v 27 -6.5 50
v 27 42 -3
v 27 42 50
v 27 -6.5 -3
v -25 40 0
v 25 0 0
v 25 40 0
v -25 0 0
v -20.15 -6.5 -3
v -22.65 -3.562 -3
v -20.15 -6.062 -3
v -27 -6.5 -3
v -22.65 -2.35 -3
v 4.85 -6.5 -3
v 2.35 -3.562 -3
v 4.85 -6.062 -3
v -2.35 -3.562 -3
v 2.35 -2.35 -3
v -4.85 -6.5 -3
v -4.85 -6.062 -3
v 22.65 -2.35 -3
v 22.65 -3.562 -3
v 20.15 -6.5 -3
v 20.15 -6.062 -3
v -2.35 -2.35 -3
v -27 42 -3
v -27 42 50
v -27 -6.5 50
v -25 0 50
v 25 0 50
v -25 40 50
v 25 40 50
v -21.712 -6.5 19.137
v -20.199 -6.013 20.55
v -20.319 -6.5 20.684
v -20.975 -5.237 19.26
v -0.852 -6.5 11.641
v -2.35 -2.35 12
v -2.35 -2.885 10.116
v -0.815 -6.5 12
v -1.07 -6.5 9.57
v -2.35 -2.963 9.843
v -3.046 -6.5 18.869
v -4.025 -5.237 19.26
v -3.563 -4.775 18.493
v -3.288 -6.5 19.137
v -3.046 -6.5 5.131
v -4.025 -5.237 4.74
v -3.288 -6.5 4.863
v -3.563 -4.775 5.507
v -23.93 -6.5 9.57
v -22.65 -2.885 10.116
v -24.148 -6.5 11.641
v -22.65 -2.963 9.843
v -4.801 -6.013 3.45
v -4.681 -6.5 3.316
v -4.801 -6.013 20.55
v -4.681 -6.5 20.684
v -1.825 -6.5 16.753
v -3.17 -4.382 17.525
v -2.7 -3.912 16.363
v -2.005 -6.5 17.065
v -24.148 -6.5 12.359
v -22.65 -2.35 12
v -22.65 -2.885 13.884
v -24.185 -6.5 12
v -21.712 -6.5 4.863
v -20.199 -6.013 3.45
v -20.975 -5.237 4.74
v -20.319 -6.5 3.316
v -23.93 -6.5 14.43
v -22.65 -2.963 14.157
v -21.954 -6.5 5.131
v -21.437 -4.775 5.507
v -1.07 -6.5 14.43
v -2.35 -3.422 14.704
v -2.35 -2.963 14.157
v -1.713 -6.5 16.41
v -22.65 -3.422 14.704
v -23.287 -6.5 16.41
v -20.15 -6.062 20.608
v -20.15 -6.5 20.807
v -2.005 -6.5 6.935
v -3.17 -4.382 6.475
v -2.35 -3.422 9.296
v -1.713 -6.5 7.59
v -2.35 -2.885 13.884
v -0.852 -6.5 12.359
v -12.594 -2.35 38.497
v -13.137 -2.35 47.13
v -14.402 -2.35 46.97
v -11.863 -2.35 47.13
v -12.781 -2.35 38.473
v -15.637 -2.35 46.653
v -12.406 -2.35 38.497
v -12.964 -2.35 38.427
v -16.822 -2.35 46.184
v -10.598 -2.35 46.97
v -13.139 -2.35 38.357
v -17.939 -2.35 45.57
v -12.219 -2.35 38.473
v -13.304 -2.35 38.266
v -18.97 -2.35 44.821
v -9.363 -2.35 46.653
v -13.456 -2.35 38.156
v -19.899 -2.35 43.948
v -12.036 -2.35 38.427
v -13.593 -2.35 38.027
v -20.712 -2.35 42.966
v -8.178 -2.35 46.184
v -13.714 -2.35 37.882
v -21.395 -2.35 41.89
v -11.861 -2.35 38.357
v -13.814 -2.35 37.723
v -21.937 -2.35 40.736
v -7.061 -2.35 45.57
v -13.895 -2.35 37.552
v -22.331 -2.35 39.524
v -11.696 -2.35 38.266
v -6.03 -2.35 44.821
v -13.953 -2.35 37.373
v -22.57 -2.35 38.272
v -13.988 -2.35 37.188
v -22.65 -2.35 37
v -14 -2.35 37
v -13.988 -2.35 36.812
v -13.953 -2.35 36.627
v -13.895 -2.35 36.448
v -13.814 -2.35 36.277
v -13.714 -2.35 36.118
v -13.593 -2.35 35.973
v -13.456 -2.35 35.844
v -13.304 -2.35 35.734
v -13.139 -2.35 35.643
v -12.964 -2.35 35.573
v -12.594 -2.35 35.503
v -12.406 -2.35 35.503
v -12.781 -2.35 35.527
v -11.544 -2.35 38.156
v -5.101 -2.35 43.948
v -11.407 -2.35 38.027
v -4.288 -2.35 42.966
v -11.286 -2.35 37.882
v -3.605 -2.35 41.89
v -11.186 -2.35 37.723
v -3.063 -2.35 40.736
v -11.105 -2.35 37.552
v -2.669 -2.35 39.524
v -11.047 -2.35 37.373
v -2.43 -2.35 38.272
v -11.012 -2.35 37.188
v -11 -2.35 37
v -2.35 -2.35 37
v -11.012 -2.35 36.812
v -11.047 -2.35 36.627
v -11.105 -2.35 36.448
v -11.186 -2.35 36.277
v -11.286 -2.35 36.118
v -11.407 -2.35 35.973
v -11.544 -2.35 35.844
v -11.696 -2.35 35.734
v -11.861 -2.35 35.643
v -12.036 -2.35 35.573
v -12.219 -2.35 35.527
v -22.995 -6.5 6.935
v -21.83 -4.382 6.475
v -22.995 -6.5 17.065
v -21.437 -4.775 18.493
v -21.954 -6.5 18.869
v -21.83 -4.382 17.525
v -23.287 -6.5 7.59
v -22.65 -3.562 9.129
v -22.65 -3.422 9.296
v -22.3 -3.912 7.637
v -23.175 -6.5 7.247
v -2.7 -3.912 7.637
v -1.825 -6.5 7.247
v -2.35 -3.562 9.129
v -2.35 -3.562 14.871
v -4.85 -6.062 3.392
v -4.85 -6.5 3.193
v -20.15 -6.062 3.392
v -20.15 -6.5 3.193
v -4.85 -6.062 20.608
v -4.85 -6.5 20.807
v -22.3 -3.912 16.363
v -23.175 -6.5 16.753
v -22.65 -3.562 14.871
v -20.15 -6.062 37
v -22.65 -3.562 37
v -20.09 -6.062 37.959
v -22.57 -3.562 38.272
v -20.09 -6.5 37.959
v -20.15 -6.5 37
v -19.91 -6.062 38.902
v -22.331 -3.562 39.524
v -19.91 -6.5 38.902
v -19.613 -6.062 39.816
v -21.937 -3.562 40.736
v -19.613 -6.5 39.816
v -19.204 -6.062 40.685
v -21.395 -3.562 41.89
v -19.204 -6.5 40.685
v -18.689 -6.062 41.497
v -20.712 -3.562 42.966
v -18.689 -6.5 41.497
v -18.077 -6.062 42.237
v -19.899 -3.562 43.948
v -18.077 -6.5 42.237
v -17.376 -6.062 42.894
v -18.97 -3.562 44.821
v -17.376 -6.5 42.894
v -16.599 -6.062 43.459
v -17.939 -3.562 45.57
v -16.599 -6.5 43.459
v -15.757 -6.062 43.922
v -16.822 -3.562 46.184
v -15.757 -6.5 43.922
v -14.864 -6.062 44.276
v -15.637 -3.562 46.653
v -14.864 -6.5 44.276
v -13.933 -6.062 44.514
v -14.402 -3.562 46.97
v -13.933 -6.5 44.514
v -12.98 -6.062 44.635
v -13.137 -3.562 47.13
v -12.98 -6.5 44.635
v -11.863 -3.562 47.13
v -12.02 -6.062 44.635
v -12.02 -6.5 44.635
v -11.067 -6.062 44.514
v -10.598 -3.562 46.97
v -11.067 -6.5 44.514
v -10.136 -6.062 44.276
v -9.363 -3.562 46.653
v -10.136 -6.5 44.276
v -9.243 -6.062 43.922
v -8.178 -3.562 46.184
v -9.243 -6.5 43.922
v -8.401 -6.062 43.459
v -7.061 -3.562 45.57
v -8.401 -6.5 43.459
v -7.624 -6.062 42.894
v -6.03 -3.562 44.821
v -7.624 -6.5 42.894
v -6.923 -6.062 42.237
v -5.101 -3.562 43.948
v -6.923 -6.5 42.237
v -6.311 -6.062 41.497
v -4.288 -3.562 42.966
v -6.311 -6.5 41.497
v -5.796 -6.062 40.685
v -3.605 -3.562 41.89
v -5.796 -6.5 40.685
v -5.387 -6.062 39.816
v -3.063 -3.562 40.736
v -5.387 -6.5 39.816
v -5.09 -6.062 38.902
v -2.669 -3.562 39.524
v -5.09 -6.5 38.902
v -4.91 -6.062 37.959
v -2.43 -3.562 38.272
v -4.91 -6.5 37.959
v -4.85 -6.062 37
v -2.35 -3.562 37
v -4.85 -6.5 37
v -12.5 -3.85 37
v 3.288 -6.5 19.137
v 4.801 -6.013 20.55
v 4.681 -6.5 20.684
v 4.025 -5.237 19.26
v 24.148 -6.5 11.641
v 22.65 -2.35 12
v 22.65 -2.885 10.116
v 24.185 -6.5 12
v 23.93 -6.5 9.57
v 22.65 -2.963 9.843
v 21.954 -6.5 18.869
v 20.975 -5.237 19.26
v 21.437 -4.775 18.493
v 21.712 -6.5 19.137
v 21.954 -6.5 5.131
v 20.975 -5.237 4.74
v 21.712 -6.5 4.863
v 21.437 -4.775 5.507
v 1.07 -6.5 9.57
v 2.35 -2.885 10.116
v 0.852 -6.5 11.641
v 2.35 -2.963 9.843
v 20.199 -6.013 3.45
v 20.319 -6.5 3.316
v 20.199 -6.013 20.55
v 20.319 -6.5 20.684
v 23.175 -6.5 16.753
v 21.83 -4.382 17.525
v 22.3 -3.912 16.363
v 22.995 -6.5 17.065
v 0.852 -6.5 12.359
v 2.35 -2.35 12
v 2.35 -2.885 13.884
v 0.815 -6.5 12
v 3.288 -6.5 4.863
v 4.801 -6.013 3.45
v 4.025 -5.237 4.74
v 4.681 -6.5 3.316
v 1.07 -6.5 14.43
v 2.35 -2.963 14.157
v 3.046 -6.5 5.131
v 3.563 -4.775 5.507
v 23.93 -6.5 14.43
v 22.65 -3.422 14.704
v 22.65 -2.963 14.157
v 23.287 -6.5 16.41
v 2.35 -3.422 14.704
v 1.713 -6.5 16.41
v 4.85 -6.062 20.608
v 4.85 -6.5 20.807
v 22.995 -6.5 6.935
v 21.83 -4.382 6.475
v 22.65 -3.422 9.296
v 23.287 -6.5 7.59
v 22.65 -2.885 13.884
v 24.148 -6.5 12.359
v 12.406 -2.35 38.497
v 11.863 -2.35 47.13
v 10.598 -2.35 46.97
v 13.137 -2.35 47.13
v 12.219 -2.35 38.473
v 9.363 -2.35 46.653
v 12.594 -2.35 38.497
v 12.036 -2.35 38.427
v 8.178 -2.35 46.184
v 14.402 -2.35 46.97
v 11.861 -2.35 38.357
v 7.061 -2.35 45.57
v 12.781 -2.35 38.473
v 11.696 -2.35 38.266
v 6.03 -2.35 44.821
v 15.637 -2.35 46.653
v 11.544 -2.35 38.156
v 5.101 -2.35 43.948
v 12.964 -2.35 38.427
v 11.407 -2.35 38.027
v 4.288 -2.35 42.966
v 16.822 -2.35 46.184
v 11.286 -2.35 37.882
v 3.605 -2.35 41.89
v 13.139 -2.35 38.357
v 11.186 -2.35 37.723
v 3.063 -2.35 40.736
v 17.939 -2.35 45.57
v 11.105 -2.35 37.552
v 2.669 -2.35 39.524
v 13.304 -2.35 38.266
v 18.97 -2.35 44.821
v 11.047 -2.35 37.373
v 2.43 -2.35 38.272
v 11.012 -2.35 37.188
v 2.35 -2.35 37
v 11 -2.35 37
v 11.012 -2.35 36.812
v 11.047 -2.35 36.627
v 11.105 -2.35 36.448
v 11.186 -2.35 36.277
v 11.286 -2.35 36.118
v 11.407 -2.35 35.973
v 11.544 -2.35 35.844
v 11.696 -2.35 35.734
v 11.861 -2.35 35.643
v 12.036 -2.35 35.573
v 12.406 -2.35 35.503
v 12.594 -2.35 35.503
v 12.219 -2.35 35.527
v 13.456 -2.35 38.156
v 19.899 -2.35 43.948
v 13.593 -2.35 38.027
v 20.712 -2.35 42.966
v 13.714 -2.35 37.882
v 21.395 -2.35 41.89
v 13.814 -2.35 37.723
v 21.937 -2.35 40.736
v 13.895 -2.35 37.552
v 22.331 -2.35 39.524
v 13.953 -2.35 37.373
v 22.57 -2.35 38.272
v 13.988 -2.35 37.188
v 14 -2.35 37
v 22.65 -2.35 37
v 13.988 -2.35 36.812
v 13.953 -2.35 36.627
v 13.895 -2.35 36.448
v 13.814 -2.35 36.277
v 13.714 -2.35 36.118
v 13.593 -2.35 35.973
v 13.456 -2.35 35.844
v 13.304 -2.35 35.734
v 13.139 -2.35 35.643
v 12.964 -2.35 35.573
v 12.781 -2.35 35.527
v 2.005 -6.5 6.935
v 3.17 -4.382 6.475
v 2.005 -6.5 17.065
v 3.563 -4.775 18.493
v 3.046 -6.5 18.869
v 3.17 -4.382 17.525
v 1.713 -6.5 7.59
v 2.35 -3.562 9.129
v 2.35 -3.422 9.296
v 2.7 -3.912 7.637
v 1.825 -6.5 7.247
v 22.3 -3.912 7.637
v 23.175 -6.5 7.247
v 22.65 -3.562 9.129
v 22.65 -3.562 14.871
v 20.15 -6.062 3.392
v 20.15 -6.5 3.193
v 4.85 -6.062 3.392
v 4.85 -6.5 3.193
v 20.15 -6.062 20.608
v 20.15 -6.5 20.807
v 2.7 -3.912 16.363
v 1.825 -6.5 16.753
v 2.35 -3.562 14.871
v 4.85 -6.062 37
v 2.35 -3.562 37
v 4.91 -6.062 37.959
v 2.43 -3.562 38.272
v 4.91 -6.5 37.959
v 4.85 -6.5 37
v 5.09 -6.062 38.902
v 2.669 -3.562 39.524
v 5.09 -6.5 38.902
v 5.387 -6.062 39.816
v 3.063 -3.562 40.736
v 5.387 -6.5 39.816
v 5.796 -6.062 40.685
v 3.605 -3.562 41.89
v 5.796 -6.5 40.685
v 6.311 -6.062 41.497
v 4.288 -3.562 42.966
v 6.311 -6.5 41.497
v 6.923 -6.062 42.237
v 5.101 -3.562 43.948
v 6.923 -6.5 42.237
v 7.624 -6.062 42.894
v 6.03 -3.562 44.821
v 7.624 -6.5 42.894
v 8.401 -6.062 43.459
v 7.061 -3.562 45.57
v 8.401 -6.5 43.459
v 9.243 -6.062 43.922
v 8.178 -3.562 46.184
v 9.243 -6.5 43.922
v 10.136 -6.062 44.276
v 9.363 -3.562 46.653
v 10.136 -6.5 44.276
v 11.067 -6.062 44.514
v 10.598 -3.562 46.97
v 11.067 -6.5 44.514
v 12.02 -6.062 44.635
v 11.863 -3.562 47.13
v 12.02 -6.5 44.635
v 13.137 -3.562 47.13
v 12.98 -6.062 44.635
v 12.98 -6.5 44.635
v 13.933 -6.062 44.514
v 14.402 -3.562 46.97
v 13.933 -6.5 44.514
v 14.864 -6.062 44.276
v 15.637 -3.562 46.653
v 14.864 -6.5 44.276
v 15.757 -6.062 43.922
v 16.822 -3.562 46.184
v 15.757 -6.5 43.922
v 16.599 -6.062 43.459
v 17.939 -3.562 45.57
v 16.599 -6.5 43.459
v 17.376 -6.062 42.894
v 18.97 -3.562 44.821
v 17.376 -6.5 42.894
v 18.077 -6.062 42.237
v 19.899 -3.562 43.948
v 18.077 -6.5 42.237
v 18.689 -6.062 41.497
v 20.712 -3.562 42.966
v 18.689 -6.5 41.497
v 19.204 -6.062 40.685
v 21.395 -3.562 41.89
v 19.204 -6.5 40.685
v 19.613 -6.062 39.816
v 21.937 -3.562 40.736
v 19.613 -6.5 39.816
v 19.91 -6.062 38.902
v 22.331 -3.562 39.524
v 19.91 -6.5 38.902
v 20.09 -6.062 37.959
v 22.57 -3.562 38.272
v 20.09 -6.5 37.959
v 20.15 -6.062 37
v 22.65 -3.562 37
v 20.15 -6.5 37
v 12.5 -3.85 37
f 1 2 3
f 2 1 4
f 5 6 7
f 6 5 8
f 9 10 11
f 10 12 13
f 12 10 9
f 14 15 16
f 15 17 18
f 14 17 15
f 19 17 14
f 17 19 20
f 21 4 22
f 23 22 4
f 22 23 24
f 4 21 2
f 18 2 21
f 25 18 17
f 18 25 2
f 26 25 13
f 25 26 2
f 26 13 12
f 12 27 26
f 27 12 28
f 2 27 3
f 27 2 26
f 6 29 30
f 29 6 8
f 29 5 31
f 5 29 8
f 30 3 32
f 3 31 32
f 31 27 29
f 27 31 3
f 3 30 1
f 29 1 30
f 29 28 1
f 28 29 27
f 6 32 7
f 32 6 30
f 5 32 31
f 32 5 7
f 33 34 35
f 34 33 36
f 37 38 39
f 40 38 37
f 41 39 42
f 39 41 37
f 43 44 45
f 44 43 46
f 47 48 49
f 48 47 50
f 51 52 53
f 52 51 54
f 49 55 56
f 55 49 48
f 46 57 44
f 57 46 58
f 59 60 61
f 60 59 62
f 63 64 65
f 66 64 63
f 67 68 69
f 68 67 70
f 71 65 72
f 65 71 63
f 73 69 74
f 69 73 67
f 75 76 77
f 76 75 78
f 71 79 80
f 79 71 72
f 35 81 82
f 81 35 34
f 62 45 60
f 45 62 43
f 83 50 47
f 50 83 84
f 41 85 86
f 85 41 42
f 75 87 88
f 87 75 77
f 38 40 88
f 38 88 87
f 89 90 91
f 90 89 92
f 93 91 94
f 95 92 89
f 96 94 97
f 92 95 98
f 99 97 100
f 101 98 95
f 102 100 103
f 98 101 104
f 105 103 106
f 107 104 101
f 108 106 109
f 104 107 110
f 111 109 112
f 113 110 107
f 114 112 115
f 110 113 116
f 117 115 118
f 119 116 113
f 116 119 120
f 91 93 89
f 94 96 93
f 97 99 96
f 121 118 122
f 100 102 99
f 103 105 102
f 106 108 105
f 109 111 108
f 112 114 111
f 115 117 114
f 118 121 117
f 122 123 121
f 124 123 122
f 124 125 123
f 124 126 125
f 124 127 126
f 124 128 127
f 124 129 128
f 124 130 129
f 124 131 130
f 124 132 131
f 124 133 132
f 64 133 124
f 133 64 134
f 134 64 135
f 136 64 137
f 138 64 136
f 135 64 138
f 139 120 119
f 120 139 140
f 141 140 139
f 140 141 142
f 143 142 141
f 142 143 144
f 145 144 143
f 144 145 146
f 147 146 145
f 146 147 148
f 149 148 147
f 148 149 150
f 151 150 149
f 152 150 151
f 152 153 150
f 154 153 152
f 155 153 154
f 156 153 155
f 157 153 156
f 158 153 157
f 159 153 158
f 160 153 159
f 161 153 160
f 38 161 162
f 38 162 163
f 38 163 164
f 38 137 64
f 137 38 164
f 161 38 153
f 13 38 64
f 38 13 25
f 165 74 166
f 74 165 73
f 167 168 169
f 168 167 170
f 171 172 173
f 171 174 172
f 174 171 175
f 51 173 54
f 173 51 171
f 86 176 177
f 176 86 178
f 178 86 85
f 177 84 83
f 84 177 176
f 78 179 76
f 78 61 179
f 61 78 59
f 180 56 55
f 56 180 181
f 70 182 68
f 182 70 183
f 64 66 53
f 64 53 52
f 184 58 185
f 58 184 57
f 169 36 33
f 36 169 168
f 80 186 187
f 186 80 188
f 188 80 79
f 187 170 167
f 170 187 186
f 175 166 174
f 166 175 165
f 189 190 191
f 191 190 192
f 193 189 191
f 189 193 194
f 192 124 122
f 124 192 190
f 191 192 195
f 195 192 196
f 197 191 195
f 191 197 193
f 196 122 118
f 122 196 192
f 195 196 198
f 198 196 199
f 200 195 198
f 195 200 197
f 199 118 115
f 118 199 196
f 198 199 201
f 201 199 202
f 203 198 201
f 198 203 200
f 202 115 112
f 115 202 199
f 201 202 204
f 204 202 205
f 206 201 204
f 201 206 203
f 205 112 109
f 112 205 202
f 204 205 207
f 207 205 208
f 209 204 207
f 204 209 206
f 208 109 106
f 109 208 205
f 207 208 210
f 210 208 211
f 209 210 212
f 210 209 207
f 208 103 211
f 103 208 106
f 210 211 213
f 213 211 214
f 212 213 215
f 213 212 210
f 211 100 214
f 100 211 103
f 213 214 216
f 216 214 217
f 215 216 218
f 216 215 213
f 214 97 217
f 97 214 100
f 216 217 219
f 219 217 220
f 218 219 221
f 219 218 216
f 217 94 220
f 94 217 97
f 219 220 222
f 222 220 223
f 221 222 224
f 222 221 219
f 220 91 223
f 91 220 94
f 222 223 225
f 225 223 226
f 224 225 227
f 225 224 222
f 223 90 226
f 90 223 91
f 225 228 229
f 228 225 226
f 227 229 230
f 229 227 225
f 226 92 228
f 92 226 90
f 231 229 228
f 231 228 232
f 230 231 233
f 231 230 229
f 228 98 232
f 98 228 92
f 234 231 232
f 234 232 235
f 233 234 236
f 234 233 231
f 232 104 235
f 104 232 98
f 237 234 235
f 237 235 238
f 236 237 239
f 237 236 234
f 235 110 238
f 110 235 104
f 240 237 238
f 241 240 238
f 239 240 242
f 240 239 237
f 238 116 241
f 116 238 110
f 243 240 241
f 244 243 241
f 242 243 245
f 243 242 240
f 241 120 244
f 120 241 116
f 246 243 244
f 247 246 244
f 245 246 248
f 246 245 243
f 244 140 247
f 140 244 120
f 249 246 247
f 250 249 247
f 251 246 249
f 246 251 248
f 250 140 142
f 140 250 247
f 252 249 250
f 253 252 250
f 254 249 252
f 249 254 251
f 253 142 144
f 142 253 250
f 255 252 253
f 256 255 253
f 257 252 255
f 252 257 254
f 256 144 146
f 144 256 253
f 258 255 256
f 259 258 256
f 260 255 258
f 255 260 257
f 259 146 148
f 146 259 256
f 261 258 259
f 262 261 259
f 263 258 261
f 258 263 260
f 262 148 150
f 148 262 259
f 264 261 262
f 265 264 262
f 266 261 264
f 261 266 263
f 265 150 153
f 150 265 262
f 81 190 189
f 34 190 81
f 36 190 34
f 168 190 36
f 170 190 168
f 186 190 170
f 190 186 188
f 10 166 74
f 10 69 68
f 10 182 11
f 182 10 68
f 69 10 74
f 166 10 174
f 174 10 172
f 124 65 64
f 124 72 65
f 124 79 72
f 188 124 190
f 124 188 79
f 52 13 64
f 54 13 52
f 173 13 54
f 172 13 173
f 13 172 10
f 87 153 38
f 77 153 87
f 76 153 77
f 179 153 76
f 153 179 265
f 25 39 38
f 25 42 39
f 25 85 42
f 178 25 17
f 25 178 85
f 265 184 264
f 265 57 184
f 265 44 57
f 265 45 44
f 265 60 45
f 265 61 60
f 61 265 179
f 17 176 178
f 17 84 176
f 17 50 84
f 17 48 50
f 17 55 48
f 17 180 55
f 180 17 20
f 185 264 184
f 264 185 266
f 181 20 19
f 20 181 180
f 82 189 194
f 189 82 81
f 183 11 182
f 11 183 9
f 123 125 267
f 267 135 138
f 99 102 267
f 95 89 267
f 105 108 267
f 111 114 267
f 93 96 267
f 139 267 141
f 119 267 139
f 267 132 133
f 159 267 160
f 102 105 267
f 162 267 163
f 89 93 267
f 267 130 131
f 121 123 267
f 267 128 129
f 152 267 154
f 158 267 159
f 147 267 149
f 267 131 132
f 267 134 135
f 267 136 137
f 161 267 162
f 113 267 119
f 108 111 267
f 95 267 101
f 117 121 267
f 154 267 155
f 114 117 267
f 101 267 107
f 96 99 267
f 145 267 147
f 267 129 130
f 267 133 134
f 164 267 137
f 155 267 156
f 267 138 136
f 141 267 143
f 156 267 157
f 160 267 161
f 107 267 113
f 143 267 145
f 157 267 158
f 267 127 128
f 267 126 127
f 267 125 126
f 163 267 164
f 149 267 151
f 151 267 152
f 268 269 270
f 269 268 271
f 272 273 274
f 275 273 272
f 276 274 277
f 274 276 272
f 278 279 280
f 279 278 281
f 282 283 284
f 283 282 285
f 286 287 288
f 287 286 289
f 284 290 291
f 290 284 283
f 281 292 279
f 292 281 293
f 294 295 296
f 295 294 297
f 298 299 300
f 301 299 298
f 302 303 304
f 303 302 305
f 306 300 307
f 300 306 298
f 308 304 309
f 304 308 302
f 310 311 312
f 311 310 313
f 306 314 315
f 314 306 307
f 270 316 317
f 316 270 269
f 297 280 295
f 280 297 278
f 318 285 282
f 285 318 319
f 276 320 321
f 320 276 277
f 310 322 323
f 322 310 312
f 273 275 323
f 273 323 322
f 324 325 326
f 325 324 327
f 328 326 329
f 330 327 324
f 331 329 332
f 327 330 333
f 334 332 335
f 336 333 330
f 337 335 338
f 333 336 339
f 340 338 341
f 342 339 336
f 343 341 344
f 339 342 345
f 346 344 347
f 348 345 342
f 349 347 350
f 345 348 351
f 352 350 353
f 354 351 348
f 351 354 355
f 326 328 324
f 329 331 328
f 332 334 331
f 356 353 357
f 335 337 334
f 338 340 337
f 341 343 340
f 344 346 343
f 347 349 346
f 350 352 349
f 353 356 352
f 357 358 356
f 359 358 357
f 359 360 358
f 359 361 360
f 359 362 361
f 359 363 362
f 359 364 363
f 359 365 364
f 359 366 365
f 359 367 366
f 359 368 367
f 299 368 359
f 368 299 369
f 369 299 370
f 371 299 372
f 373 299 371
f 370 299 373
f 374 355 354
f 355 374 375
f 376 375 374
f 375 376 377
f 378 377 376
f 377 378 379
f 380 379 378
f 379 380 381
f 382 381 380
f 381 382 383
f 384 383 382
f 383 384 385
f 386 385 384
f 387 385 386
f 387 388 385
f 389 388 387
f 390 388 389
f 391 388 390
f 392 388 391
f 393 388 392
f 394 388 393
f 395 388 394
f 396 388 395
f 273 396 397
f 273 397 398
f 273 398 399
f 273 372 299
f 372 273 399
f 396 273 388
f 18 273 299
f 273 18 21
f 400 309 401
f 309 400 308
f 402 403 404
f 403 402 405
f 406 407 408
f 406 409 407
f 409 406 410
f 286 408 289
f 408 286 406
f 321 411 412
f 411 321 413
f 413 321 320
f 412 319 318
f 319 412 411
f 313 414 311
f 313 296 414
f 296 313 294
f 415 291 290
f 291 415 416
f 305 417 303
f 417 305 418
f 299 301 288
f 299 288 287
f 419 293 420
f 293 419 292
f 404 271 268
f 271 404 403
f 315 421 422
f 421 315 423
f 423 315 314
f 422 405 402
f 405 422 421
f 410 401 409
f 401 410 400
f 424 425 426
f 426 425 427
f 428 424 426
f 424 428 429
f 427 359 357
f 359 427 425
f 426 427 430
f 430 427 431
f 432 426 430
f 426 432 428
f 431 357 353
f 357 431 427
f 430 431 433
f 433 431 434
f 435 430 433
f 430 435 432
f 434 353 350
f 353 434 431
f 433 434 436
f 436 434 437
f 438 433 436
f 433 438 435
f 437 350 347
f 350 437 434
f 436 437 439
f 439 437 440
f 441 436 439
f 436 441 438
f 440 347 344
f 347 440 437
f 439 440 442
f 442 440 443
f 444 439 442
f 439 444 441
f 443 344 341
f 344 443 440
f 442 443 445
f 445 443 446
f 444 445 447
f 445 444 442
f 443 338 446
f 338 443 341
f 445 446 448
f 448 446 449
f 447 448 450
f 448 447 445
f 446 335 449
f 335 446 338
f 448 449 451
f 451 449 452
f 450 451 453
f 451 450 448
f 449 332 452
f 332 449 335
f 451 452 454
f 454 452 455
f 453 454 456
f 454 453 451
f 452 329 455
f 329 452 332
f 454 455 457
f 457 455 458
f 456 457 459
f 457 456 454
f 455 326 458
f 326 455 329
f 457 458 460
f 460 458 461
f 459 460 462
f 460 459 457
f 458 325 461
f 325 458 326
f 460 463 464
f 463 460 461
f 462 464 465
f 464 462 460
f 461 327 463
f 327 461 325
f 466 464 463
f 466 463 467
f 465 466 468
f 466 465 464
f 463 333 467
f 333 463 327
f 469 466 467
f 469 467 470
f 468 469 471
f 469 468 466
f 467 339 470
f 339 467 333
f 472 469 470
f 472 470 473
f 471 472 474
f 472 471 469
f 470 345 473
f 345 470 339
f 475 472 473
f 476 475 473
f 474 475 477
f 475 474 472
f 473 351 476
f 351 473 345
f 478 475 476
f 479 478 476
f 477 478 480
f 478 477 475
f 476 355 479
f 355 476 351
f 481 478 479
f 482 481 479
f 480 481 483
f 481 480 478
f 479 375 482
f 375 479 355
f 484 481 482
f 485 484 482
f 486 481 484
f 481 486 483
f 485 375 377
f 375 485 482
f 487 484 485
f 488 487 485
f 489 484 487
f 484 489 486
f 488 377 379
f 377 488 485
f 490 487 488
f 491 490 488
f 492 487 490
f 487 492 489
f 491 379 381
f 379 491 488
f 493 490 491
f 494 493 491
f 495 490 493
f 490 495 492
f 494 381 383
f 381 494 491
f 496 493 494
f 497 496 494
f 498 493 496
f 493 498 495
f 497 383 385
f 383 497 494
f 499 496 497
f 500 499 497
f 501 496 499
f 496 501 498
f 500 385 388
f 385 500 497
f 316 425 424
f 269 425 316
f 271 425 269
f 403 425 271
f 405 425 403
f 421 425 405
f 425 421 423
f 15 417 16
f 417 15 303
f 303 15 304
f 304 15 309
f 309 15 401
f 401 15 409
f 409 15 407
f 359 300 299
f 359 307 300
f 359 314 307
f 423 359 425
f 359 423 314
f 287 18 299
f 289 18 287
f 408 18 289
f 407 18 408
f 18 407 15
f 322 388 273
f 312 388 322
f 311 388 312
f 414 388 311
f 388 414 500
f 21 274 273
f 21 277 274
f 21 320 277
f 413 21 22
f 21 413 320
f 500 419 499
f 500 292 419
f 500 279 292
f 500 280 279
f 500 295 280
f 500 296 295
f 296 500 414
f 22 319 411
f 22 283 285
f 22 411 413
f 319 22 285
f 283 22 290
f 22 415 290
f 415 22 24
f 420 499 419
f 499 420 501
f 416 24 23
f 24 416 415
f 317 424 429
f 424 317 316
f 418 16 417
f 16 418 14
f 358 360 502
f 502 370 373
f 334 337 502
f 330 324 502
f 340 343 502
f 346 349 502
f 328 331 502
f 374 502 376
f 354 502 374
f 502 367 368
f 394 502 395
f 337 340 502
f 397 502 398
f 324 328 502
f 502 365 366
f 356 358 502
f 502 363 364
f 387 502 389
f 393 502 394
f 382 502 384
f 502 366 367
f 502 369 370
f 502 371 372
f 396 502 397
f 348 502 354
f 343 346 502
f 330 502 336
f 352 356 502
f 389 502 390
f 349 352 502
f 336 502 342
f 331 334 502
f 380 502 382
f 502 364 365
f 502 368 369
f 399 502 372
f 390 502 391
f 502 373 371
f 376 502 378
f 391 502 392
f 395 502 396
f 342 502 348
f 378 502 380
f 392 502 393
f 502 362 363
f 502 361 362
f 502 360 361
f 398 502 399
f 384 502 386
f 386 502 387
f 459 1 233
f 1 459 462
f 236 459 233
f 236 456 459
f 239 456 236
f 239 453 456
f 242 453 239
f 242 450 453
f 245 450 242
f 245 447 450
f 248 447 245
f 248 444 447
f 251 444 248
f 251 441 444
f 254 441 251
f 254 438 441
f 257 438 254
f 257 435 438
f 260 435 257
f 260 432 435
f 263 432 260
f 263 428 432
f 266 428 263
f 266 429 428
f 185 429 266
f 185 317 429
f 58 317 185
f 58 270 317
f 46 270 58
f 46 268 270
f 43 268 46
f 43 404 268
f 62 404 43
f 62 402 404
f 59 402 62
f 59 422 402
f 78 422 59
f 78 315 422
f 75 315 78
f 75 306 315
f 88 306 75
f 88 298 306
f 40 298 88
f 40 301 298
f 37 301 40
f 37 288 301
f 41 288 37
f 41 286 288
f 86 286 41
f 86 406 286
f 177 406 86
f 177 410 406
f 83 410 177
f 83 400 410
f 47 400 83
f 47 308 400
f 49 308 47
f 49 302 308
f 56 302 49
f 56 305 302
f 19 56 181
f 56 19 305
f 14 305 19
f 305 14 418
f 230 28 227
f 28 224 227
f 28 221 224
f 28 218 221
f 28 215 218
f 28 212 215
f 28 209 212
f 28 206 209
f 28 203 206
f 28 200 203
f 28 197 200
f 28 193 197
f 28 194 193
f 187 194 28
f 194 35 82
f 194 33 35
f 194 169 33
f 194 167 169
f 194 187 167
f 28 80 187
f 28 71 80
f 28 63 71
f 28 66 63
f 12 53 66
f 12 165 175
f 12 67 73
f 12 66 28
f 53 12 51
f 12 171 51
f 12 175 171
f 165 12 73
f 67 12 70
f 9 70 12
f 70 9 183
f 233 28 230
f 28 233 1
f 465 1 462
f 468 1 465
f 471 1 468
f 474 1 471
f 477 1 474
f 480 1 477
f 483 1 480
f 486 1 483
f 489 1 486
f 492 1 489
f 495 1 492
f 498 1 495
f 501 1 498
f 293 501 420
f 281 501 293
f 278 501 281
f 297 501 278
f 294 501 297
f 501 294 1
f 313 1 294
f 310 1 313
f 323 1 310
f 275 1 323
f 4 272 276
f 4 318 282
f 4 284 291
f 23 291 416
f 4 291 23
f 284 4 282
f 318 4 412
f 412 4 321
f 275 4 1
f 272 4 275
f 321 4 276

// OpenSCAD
/* [Internal Dimensions] */
//Height (in mm) from the top of the back to the base of the internal floor
internalHeight = 50.0; //.1
//Width (in mm) of the internal dimension or item you wish to hold
internalWidth = 50.0; //.1
//Length (i.e., distance from back) (in mm) of the internal dimension or item you wish to hold
internalDepth = 40.0; //.1

/* [Additional Customization] */
//Thickness of bin walls (in mm)
wallThickness = 2; //.1
//Thickness of bin  (in mm)
baseThickness = 3; //.1

/*[Slot Customization]*/
//Distance between Multiconnect slots on the back (25mm is standard for MultiBoard)
distanceBetweenSlots = 25;
//QuickRelease removes the small indent in the top of the slots that lock the part into place
slotQuickRelease = false;
//Dimple scale tweaks the size of the dimple in the slot for printers that need a larger dimple to print correctly
dimpleScale = 1; //[0.5:.05:1.5]
//Scale the size of slots in the back (1.015 scale is default for a tight fit. Increase if your finding poor fit. )
slotTolerance = 1.00; //[0.925:0.005:1.075]
//Move the slot in (positive) or out (negative)
slotDepthMicroadjustment = 0; //[-.5:0.05:.5]
//enable a slot on-ramp for easy mounting of tall items
onRampEnabled = true;
//frequency of slots for on-ramp. 1 = every slot; 2 = every 2 slots; etc.
onRampEveryXSlots = 1;


/* [Hidden] */

//Calculated
totalWidth = internalWidth + wallThickness*2;
totalHeight = internalHeight + baseThickness;

//move to center
translate(v = [-internalWidth/2,0,0])
    basket();
translate(v = [-max(totalWidth,distanceBetweenSlots)/2,0,-baseThickness])
    multiconnectBack(backWidth = totalWidth, backHeight = totalHeight, distanceBetweenSlots = distanceBetweenSlots);

//Create Basket
module basket() {
    union() {
        //bottom
        translate([-wallThickness,0,-baseThickness])
            cube([internalWidth + wallThickness*2, internalDepth + wallThickness,baseThickness]);

        //left wall
        translate([-wallThickness,0,0])
            cube([wallThickness, internalDepth + wallThickness, internalHeight]);

        //right wall
        translate([internalWidth,0,0])
            cube([wallThickness, internalDepth + wallThickness, internalHeight]);

        difference() {
        //frontCapture
            translate([0,internalDepth,0])
                cube([internalWidth,wallThickness,internalHeight]);
        }
    }

}

//BEGIN MODULES
//Slotted back Module
module multiconnectBack(backWidth, backHeight, distanceBetweenSlots)
{
    //slot count calculates how many slots can fit on the back. Based on internal width for buffer.
    //slot width needs to be at least the distance between slot for at least 1 slot to generate
    let (backWidth = max(backWidth,distanceBetweenSlots), backHeight = max(backHeight, 25),slotCount = floor(backWidth/distanceBetweenSlots), backThickness = 6.5){
        difference() {
            translate(v = [0,-backThickness,0]) cube(size = [backWidth,backThickness,backHeight]);
            //Loop through slots and center on the item
            //Note: I kept doing math until it looked right. It's possible this can be simplified.
            for (slotNum = [0:1:slotCount-1]) {
                translate(v = [distanceBetweenSlots/2+(backWidth/distanceBetweenSlots-slotCount)*distanceBetweenSlots/2+slotNum*distanceBetweenSlots,-2.35+slotDepthMicroadjustment,backHeight-13]) {
                    slotTool(backHeight);
                }
            }
        }
    }
    //Create Slot Tool
    module slotTool(totalHeight) {
        scale(v = slotTolerance)
        //slot minus optional dimple with optional on-ramp
        let (slotProfile = [[0,0],[10.15,0],[10.15,1.2121],[7.65,3.712],[7.65,5],[0,5]])
        difference() {
            union() {
                //round top
                rotate(a = [90,0,0,])
                    rotate_extrude($fn=50)
                        polygon(points = slotProfile);
                //long slot
                translate(v = [0,0,0])
                    rotate(a = [180,0,0])
                    linear_extrude(height = totalHeight+1)
                        union(){
                            polygon(points = slotProfile);
                            mirror([1,0,0])
                                polygon(points = slotProfile);
                        }
                //on-ramp
                if(onRampEnabled)
                    for(y = [1:onRampEveryXSlots:totalHeight/distanceBetweenSlots])
                        translate(v = [0,-5,-y*distanceBetweenSlots])
                            rotate(a = [-90,0,0])
                                 cylinder(h = 5, r1 = 12, r2 = 10.15);
            }
            //dimple
            if (slotQuickRelease == false)
                scale(v = dimpleScale)
                rotate(a = [90,0,0,])
                    rotate_extrude($fn=50)
                        polygon(points = [[0,0],[0,1.5],[1.5,0]]);
        }
    }
}
